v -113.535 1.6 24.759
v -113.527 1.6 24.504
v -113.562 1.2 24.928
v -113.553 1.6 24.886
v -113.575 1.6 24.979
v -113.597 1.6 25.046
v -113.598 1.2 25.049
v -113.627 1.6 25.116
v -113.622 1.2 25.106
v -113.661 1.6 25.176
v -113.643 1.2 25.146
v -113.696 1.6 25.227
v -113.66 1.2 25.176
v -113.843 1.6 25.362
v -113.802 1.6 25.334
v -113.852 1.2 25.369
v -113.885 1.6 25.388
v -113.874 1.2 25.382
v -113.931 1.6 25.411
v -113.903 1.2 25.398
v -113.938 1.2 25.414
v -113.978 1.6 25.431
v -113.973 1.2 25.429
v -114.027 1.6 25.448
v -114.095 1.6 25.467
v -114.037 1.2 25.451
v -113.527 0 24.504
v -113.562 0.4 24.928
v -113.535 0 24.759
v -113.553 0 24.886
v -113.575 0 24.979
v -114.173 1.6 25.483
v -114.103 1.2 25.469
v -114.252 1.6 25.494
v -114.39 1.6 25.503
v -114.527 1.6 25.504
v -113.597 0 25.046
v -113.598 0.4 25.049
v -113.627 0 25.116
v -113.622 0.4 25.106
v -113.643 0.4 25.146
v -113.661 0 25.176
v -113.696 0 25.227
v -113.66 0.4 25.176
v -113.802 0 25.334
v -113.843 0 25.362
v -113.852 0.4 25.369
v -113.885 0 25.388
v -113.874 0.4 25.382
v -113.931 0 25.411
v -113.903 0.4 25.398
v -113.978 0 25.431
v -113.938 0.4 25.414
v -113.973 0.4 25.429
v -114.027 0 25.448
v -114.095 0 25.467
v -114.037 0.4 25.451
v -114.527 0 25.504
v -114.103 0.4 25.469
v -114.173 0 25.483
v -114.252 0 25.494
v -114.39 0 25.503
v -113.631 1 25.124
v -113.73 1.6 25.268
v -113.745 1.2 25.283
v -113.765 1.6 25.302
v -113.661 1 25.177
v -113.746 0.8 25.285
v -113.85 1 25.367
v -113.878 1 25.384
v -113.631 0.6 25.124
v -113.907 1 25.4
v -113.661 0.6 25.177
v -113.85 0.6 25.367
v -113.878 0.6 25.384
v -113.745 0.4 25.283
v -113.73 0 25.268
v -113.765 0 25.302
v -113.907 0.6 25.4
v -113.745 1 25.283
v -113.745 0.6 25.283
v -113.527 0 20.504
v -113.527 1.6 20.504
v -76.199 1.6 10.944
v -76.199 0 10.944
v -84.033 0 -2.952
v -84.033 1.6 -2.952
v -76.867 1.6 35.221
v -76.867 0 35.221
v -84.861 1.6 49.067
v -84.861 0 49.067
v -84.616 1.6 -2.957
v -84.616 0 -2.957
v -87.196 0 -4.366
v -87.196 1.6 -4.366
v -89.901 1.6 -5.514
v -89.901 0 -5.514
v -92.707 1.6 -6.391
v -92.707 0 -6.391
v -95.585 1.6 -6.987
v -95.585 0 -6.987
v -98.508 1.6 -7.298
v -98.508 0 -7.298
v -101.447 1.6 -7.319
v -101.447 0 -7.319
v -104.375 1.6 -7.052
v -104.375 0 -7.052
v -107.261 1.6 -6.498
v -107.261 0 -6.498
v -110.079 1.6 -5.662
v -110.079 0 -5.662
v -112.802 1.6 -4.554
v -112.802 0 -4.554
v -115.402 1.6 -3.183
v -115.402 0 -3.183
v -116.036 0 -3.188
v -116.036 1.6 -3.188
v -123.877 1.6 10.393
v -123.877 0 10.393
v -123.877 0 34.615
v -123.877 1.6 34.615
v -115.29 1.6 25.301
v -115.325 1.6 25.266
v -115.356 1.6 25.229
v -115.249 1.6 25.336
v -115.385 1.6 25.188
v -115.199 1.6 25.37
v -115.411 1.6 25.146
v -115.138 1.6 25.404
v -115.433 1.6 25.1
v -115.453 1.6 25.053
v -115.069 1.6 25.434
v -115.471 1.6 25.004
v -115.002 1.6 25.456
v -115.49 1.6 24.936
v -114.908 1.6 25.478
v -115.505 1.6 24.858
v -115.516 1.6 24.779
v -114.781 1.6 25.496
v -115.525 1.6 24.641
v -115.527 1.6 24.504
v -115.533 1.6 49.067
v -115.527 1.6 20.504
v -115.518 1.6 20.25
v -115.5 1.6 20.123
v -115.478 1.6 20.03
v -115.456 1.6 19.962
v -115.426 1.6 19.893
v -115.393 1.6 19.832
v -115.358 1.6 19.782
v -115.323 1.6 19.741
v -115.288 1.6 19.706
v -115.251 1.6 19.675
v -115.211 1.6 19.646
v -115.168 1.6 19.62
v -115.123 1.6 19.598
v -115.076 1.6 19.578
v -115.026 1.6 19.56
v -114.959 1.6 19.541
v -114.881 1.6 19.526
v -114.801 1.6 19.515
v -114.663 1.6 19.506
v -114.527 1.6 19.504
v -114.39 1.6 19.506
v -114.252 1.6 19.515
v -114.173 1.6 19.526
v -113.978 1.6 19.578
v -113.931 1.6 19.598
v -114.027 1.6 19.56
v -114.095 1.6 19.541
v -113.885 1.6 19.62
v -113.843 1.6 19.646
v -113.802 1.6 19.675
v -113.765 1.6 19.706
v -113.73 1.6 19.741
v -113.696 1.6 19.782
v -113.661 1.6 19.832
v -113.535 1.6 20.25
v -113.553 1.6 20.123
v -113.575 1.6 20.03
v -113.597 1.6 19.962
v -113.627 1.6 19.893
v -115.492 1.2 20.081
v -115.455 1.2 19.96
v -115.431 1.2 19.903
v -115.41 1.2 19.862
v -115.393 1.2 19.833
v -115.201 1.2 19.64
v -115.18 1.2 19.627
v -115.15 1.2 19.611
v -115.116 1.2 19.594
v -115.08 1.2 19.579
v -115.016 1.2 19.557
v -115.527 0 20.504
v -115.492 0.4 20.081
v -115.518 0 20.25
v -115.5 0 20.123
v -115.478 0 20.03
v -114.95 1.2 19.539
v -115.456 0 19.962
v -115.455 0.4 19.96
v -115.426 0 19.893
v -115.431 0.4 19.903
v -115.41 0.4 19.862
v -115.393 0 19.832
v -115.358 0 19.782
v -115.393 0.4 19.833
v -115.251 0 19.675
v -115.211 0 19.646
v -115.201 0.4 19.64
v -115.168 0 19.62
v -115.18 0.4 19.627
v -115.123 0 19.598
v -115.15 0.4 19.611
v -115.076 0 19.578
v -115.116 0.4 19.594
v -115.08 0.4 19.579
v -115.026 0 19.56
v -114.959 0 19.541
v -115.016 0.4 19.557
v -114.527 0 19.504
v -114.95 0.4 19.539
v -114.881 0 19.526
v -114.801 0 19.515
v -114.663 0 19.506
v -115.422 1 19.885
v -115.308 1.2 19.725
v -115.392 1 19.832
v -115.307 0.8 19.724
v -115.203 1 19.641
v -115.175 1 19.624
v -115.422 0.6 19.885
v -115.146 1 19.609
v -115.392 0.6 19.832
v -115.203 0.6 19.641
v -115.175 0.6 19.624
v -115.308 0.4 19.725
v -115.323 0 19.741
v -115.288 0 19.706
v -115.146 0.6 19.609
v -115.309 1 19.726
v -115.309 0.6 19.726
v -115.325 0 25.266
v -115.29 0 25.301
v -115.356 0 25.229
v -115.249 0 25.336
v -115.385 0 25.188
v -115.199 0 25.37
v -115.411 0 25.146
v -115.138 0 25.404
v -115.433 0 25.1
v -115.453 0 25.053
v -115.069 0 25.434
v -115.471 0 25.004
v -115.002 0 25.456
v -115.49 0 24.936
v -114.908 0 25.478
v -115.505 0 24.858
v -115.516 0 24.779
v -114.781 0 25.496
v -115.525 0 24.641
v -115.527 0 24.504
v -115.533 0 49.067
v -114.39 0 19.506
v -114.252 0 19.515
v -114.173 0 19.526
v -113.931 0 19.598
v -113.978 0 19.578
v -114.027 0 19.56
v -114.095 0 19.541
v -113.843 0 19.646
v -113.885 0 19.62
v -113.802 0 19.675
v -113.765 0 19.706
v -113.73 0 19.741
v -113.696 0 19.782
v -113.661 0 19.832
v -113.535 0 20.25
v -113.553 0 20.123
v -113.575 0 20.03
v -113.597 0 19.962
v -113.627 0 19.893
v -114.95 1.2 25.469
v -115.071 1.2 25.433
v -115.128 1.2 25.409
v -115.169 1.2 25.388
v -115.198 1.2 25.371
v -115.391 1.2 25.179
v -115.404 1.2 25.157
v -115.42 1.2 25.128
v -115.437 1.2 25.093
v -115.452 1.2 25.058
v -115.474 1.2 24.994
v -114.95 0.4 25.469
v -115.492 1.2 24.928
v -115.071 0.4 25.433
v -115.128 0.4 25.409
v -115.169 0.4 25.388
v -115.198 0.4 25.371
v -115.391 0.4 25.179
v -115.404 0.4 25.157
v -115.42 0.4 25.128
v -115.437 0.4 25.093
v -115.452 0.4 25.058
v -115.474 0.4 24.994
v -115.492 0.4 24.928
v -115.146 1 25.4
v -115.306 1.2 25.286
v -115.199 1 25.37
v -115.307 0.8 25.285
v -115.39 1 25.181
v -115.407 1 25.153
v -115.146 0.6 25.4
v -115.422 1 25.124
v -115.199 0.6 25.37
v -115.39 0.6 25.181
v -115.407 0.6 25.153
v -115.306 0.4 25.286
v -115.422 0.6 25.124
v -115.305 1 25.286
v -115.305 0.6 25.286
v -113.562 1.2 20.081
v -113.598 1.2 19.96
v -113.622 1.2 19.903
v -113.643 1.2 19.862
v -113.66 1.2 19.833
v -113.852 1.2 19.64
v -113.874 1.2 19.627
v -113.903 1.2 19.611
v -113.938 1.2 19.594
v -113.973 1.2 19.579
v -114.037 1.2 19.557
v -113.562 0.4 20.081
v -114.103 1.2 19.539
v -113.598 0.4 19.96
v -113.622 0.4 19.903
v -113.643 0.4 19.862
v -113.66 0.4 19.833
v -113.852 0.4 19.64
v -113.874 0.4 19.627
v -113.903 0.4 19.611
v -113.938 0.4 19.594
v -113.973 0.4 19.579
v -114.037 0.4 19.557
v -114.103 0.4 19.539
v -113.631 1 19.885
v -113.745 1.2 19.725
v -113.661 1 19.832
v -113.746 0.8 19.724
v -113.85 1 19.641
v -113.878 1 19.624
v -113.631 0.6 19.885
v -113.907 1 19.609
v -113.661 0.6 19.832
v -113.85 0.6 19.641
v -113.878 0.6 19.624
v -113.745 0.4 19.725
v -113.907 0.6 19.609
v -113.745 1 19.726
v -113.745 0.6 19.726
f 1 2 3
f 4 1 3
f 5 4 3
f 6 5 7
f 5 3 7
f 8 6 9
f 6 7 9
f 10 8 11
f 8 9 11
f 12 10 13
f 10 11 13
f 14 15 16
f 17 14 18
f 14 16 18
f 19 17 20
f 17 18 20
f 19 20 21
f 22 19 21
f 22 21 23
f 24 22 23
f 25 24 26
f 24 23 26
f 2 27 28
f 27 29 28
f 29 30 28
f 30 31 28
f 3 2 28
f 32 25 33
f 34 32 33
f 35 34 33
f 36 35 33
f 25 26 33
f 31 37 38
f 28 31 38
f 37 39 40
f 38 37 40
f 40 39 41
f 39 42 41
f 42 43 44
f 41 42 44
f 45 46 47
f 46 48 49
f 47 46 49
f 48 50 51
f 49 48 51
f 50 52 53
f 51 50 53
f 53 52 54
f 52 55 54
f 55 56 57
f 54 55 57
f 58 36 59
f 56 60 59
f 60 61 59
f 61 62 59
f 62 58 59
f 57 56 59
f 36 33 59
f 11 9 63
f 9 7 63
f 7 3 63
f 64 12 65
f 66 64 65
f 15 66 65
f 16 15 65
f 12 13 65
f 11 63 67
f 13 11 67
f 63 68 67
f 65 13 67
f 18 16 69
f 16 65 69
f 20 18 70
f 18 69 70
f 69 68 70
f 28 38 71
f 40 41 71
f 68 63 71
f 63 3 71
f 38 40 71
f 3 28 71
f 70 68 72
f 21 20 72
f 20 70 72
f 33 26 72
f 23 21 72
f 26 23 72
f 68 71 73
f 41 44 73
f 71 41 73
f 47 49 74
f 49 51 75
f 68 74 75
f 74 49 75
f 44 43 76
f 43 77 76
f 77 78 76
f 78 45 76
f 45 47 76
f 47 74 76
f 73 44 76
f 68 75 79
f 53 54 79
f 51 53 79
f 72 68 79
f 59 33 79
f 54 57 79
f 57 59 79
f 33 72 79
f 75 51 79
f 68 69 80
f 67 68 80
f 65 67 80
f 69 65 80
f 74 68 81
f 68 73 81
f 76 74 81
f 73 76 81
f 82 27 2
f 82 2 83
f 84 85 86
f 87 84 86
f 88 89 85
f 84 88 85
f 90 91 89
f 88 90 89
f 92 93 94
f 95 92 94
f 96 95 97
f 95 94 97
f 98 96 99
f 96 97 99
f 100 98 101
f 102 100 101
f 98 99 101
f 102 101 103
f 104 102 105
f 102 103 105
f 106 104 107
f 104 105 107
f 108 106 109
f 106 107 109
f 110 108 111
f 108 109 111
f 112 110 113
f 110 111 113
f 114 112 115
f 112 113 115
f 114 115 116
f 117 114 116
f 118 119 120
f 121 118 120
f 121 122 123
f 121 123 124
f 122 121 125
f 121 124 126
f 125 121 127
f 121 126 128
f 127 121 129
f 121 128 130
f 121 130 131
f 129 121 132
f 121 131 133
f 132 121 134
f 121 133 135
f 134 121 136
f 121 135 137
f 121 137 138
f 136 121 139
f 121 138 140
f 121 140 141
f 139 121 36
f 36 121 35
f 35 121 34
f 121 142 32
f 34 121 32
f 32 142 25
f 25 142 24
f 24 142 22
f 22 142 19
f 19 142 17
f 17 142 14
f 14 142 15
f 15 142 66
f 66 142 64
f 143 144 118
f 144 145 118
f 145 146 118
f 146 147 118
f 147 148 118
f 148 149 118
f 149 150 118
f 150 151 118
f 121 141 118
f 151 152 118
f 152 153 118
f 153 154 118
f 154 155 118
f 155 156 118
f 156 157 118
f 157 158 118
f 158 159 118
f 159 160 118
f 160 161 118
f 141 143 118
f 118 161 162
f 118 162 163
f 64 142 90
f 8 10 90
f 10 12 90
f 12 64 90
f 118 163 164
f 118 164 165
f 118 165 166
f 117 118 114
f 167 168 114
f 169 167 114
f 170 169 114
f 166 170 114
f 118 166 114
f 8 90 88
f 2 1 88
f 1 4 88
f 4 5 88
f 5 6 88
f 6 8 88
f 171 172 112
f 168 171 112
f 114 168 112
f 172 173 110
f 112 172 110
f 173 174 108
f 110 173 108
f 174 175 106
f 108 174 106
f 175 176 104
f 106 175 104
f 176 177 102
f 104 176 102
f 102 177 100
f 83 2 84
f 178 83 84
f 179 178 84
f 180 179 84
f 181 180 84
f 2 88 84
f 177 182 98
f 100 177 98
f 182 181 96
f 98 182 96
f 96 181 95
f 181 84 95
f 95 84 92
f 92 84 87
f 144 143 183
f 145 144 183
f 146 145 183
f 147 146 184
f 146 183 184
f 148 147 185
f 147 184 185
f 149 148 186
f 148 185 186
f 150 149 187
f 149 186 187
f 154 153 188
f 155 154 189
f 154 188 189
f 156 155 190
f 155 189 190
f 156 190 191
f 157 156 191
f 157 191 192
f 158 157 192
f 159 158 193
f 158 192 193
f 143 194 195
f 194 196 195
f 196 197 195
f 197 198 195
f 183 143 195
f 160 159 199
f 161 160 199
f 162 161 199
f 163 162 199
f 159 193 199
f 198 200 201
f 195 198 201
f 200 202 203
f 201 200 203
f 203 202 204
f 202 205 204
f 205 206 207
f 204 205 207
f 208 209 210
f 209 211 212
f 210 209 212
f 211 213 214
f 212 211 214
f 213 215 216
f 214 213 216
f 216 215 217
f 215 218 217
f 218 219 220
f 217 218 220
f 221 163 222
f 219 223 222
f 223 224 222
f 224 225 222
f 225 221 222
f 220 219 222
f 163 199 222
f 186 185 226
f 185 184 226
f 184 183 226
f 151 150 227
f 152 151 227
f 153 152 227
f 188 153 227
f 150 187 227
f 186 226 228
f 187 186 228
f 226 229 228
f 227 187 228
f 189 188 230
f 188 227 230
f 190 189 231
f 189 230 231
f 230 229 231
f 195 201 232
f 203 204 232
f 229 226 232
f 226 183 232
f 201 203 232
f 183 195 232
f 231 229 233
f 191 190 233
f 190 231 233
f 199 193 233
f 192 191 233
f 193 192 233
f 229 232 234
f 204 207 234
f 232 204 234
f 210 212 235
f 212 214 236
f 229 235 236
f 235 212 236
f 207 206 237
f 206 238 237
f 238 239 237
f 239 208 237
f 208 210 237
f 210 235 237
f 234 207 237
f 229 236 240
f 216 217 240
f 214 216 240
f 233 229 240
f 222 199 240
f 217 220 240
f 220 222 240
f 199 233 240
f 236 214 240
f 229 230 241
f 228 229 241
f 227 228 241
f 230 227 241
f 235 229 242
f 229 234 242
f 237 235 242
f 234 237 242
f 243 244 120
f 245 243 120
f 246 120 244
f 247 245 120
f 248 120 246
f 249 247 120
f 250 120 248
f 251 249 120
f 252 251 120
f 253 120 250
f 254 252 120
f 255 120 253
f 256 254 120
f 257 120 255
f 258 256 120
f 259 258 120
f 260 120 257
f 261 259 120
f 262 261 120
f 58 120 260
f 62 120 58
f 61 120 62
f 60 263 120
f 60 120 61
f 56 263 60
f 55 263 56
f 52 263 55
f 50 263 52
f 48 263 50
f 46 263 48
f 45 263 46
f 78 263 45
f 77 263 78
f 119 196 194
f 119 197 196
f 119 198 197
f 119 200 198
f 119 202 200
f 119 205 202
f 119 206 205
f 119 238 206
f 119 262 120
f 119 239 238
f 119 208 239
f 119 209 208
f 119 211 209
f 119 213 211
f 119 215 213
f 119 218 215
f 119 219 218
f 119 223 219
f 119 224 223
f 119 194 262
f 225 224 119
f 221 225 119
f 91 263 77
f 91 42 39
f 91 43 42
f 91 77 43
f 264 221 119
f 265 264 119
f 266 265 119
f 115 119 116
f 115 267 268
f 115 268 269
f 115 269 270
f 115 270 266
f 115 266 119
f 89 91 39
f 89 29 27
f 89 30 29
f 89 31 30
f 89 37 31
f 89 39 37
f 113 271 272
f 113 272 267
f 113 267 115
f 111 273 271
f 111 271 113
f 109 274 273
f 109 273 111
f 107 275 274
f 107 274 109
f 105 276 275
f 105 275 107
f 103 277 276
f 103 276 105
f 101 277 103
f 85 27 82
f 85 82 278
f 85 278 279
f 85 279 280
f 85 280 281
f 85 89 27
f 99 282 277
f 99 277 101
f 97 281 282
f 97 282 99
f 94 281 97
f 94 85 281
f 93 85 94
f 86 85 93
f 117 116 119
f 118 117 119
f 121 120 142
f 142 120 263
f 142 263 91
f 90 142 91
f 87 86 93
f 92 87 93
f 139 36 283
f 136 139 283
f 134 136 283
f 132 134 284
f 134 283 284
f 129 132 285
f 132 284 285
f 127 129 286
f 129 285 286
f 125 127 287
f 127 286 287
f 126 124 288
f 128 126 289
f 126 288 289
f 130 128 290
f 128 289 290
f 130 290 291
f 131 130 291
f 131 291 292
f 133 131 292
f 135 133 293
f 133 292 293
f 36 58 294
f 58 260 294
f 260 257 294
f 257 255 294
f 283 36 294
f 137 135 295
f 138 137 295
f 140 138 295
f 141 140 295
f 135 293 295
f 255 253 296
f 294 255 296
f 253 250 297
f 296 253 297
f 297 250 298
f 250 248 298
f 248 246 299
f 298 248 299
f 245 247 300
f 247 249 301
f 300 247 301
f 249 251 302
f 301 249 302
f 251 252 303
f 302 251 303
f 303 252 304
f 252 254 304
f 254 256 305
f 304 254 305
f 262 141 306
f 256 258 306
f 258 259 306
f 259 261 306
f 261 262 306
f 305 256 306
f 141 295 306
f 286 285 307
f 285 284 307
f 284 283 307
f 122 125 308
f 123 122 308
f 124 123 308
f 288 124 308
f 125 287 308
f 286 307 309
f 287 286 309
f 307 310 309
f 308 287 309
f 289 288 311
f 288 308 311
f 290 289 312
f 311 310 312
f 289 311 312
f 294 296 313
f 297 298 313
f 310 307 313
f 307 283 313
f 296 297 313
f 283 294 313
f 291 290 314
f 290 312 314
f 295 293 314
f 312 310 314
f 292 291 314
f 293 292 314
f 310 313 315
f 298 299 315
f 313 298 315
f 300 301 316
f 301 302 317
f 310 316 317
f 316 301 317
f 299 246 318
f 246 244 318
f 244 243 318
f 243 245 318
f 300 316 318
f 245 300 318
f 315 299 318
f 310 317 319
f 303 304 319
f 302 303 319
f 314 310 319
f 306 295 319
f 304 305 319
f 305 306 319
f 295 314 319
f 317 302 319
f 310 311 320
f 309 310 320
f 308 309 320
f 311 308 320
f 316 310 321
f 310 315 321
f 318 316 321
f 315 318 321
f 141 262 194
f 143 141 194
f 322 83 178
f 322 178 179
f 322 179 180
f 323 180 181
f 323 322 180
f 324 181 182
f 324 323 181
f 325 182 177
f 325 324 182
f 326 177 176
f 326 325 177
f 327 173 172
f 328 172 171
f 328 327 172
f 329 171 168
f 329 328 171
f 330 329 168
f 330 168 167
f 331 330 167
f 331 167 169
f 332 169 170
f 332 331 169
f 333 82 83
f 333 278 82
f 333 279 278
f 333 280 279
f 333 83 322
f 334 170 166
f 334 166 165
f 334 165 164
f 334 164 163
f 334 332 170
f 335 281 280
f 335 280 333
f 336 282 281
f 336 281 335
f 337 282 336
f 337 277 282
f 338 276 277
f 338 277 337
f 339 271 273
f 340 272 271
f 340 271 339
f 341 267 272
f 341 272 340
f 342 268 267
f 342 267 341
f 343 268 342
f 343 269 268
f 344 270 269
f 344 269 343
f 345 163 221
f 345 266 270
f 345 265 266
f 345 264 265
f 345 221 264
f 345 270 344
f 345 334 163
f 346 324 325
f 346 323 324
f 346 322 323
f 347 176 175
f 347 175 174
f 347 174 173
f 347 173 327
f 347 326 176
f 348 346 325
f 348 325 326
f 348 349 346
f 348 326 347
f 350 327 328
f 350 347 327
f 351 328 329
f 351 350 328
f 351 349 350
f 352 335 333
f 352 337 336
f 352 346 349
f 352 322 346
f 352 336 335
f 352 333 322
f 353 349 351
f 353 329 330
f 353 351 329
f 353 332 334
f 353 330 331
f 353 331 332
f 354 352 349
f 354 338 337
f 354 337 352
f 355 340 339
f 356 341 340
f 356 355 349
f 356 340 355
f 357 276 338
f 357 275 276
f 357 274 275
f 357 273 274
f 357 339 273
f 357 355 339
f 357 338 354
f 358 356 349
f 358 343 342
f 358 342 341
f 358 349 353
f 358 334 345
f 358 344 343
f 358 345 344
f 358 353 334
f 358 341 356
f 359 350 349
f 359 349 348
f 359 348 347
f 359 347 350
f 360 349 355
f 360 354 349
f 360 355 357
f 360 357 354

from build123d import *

# Parameters (mm, degrees)
SKETCH2_W           = 2
SKETCH2_H           = 6
BOSS_EXTRUDE1_DEPTH = 1.6
FILLET1_SIZE        = 1


with BuildPart() as part:
    # Sketch2 → Boss-Extrude1 (new body)
    with BuildSketch(Plane(origin=(0, 0, 0), x_dir=(1, 0, 0), z_dir=(0, 1, 0))):
        with BuildLine():
            Line((-123.876706844, -10.393367026), (-123.876706844, -34.615283413))
            Line((-123.876706844, -34.615283413), (-115.532924627, -49.06713814))
            Line((-115.532924627, -49.06713814), (-84.860830246, -49.06713814))
            Line((-84.860830246, -49.06713814), (-76.867006735, -35.221429673))
            Line((-76.867006735, -35.221429673), (-76.19895922, -10.944023897))
            Line((-76.19895922, -10.944023897), (-84.03338266, 2.952288601))
            Line((-84.03338266, 2.952288601), (-84.615952241, 2.956571663))
            ThreePointArc((-84.615952241, 2.956571663), (-99.977425615, 7.344868085), (-115.401760623, 3.182909496))
            Line((-115.401760623, 3.182909496), (-116.035748857, 3.187570589))
            Line((-116.035748857, 3.187570589), (-123.876706844, -10.393367026))
        make_face()
        with Locations((-114.526706844, -22.504325219)):
            Rectangle(SKETCH2_W, SKETCH2_H, mode=Mode.SUBTRACT)
    extrude(amount=BOSS_EXTRUDE1_DEPTH)

    # Fillet1
    # a fillet whose section is not a circle: 1 mm, written as the material it adds along each edge
    with BuildSketch(Plane(origin=(-113.526706844, 0, 25.504325219), x_dir=(0, 0, -1), z_dir=(0, 1, 0)), Plane(origin=(-115.526706844, 0, 25.504325219), x_dir=(1, 0, 0), z_dir=(0, 1, 0)), Plane(origin=(-115.526706844, 0, 19.504325219), x_dir=(0, 0, 1), z_dir=(0, 1, 0))) as fillet1_piece_1:
        with BuildLine():
            add(Edge.make_bspline([(FILLET1_SIZE, 0), (FILLET1_SIZE * 0.831801948466, 0), (FILLET1_SIZE * 0.663603896932, 0), (FILLET1_SIZE * 0.292893218813, FILLET1_SIZE * 0.0716919198361), (FILLET1_SIZE * 0.0716919198361, FILLET1_SIZE * 0.292893218813), (0, FILLET1_SIZE * 0.663603896932), (0, FILLET1_SIZE * 0.831801948466), (0, FILLET1_SIZE)], knots=[0, 0, 0, 0, 0, 0, 0.5, 0.5, 1, 1, 1, 1, 1, 1], degree=5))
            Line((0, FILLET1_SIZE), (-FILLET1_SIZE * 0.02, FILLET1_SIZE))
            Line((-FILLET1_SIZE * 0.02, FILLET1_SIZE), (-FILLET1_SIZE * 0.02, -FILLET1_SIZE * 0.02))
            Line((-FILLET1_SIZE * 0.02, -FILLET1_SIZE * 0.02), (FILLET1_SIZE, -FILLET1_SIZE * 0.02))
            Line((FILLET1_SIZE, -FILLET1_SIZE * 0.02), (FILLET1_SIZE, 0))
        make_face()
    extrude(amount=1.6)
    with BuildSketch(Plane(origin=(-113.526706844, 0, 19.504325219), x_dir=(0, 0, 1), z_dir=(0, 1, 0))) as fillet1_piece_2:
        with BuildLine():
            add(Edge.make_bspline([(FILLET1_SIZE, 0), (FILLET1_SIZE * 0.831801948466, 0), (FILLET1_SIZE * 0.663603896932, 0), (FILLET1_SIZE * 0.292893218813, -FILLET1_SIZE * 0.0716919198361), (FILLET1_SIZE * 0.0716919198361, -FILLET1_SIZE * 0.292893218813), (0, -FILLET1_SIZE * 0.663603896932), (0, -FILLET1_SIZE * 0.831801948466), (0, -FILLET1_SIZE)], knots=[0, 0, 0, 0, 0, 0, 0.5, 0.5, 1, 1, 1, 1, 1, 1], degree=5))
            Line((0, -FILLET1_SIZE), (-FILLET1_SIZE * 0.02, -FILLET1_SIZE))
            Line((-FILLET1_SIZE * 0.02, -FILLET1_SIZE), (-FILLET1_SIZE * 0.02, FILLET1_SIZE * 0.02))
            Line((-FILLET1_SIZE * 0.02, FILLET1_SIZE * 0.02), (FILLET1_SIZE, FILLET1_SIZE * 0.02))
            Line((FILLET1_SIZE, FILLET1_SIZE * 0.02), (FILLET1_SIZE, 0))
        make_face()
    extrude(amount=1.6)


solid = part.part
